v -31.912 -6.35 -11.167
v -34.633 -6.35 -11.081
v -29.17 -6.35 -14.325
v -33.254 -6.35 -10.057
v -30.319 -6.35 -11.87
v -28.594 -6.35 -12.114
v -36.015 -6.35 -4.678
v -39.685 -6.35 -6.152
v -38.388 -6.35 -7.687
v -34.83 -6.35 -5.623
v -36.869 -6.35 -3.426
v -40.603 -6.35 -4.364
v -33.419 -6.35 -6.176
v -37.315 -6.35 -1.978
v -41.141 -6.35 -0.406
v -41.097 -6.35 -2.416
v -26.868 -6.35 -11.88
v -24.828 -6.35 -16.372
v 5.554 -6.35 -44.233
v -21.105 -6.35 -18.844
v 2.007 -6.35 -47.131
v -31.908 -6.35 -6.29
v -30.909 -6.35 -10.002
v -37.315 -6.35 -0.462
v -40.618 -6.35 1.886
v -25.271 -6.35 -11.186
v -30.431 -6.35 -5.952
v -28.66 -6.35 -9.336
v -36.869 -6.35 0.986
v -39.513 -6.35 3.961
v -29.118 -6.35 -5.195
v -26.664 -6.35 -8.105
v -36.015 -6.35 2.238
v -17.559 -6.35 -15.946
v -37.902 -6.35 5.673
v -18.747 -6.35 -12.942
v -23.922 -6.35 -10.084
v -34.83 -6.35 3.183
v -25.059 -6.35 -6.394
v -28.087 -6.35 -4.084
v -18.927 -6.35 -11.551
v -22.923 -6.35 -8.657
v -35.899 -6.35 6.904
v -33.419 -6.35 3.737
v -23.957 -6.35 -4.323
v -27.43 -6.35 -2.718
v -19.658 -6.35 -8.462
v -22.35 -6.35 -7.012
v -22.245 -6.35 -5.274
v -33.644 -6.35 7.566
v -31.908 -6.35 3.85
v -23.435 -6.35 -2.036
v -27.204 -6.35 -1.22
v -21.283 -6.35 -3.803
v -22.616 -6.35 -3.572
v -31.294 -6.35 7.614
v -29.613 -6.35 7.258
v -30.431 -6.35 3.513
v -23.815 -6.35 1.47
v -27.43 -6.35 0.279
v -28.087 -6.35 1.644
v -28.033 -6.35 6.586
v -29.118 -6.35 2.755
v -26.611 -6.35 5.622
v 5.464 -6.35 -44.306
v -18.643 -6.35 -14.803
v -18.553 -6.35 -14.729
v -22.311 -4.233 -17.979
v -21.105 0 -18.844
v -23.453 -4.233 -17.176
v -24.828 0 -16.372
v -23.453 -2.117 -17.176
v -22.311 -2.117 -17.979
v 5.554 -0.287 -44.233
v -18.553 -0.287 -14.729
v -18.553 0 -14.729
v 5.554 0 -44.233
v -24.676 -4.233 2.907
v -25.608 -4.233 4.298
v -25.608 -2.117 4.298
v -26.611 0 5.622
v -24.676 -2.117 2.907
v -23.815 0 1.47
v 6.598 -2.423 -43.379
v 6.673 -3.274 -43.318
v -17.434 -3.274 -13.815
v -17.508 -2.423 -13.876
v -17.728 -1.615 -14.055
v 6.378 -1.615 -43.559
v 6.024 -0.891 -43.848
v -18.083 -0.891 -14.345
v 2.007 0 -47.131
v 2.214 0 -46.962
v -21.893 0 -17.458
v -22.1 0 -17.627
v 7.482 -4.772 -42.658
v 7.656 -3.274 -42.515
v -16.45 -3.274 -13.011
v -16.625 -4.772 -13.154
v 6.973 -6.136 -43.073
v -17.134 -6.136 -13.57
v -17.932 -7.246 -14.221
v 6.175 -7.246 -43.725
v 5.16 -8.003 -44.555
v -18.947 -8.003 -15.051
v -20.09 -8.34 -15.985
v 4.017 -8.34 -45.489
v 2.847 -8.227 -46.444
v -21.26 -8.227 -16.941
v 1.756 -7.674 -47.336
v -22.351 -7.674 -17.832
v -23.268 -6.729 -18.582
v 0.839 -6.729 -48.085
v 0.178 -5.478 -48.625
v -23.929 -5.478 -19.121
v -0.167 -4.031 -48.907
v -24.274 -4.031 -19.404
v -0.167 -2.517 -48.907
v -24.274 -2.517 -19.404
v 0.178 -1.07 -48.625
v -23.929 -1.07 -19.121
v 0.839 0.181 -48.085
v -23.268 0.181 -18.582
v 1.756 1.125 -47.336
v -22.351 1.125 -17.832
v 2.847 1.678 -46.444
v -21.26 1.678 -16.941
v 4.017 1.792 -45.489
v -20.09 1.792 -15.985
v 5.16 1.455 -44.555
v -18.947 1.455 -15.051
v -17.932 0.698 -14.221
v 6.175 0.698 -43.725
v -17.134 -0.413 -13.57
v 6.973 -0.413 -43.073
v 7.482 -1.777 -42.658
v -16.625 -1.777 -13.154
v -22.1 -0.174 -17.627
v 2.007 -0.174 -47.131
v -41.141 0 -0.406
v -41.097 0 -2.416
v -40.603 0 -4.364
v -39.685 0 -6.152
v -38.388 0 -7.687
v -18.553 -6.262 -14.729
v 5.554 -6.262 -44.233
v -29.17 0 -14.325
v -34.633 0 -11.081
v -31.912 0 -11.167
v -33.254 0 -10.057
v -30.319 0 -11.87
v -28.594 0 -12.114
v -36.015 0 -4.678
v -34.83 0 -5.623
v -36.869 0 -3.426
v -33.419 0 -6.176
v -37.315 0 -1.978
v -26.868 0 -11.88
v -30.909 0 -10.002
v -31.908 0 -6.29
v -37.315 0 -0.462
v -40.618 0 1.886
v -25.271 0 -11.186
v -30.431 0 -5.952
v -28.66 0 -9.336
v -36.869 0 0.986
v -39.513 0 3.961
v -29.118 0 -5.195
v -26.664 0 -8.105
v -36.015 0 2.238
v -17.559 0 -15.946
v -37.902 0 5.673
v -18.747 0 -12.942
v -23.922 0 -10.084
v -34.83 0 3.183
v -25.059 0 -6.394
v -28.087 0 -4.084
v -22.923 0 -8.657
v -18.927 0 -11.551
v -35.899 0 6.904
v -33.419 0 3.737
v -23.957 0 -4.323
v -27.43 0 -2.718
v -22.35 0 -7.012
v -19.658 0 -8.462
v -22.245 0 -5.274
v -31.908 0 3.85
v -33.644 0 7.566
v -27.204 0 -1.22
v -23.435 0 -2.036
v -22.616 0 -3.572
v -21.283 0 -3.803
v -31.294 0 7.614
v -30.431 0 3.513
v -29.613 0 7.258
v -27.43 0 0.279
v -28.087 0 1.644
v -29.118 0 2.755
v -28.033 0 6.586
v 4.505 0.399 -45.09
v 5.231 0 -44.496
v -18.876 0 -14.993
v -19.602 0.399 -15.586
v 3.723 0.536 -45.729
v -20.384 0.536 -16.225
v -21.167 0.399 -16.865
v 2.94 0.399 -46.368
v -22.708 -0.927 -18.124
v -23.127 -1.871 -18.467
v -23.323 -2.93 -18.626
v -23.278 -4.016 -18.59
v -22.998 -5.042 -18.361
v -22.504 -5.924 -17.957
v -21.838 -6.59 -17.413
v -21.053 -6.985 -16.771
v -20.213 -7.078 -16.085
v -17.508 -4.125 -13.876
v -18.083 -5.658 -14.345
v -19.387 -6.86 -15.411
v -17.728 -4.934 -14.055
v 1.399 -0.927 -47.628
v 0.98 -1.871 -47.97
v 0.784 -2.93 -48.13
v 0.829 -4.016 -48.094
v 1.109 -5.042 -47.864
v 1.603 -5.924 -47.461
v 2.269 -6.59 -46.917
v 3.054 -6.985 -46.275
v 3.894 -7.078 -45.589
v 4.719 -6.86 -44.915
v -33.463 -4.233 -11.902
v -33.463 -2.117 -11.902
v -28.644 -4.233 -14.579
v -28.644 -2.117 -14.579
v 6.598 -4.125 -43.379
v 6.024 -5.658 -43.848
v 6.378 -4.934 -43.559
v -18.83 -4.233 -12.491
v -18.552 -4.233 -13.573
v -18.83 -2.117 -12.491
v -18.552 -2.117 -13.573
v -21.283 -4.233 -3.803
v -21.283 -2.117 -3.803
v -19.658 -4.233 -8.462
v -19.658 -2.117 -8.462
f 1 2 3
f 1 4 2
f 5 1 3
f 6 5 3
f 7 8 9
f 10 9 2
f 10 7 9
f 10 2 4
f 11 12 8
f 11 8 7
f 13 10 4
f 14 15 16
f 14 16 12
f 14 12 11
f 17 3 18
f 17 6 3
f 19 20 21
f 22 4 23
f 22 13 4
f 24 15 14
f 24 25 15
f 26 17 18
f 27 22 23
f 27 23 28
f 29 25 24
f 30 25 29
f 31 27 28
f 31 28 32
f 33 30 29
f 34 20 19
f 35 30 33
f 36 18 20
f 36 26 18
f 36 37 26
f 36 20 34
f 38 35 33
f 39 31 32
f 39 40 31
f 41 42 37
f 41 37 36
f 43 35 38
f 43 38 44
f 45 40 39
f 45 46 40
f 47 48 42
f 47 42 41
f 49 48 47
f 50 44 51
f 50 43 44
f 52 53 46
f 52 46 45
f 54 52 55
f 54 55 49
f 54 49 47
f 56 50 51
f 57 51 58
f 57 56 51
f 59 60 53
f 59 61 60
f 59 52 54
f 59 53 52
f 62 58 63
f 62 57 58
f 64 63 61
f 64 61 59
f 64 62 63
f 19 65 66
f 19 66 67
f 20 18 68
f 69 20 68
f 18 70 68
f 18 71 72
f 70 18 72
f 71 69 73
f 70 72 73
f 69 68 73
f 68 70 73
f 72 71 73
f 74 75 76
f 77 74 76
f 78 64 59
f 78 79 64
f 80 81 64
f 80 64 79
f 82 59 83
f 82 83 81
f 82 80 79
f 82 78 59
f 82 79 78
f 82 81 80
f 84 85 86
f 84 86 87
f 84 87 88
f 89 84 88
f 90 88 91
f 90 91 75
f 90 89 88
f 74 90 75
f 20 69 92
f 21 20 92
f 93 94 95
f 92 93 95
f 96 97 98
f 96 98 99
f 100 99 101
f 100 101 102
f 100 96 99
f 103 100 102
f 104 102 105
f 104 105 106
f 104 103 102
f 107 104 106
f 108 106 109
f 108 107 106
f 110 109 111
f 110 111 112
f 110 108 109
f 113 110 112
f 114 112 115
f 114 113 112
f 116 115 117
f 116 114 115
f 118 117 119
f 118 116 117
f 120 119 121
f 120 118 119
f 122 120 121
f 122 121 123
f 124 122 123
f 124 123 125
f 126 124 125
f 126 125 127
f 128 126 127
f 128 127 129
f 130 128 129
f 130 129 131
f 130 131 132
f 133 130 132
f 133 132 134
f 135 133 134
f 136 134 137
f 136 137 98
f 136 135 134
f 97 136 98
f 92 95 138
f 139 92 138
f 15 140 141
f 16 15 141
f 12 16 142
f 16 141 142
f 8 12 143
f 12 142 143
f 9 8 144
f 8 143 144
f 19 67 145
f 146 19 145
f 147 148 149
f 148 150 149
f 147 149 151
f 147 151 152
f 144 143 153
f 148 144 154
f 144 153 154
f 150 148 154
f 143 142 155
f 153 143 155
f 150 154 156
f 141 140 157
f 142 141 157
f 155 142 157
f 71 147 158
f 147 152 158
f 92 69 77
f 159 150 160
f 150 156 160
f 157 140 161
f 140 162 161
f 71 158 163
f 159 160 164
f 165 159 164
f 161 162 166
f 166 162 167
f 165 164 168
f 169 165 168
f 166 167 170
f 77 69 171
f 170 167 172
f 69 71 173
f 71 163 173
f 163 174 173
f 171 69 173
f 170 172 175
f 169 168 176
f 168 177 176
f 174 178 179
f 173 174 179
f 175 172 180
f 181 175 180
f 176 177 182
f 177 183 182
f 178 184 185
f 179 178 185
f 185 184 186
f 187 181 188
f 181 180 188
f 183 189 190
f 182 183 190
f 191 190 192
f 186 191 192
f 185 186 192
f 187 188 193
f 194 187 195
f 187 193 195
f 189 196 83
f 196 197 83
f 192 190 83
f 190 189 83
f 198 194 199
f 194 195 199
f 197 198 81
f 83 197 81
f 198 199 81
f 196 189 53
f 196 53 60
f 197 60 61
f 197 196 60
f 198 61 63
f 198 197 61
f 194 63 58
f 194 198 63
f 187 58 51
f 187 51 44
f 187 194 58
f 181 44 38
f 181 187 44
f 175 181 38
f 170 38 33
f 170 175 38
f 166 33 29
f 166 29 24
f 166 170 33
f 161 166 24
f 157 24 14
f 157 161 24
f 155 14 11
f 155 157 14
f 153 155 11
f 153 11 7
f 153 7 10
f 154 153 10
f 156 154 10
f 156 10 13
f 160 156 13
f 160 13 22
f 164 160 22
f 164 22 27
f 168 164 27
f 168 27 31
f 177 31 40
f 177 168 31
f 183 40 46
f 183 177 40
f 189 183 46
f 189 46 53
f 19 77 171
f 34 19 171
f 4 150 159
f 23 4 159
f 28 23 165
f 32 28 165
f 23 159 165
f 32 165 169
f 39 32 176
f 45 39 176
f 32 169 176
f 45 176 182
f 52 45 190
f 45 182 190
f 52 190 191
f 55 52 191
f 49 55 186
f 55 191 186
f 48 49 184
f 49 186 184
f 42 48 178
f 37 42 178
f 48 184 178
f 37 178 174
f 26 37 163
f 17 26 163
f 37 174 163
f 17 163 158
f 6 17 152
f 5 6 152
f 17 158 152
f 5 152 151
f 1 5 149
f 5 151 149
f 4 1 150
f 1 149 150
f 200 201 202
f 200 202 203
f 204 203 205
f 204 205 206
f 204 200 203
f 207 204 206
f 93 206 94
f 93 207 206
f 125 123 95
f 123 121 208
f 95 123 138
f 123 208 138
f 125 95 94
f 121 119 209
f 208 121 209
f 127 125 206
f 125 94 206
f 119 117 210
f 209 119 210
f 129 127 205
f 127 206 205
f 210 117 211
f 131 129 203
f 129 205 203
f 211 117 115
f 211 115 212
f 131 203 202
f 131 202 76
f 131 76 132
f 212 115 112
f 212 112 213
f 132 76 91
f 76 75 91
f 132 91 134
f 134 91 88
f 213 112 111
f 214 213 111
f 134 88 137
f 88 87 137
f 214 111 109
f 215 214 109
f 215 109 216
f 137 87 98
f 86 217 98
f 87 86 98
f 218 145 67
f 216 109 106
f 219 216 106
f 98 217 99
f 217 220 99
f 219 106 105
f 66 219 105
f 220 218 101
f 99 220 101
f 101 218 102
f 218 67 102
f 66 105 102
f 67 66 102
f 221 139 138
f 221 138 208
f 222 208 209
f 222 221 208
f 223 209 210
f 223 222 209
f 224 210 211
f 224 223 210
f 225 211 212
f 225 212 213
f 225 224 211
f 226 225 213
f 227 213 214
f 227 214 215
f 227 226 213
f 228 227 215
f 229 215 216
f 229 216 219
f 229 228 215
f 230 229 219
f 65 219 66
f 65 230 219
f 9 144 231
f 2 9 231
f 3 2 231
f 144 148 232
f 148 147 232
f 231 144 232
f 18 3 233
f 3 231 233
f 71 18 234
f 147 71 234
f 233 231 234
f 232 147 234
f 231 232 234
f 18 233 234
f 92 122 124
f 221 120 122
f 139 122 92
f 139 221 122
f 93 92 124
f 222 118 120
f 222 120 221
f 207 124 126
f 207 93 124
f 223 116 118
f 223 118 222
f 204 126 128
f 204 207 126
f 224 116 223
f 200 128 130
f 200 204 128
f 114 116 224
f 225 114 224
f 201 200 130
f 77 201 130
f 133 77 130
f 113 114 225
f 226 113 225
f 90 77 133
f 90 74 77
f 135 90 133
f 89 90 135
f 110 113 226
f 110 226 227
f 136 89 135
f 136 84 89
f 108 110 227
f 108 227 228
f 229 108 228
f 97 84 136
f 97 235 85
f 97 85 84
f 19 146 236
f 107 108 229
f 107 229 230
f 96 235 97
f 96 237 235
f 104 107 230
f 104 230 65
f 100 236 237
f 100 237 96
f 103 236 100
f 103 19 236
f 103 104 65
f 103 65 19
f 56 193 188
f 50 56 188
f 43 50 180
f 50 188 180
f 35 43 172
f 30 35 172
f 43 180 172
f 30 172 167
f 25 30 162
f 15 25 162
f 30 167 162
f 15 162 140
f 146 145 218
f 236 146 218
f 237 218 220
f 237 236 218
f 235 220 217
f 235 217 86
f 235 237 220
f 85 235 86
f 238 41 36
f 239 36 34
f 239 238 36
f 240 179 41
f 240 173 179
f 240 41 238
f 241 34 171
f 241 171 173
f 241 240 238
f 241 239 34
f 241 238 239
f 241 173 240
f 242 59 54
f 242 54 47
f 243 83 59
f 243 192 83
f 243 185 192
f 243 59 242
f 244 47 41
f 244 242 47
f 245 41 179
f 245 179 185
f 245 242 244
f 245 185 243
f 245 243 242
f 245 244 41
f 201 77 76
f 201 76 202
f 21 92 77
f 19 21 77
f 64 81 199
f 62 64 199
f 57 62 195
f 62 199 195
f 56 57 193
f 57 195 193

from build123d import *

# Parameters (mm, degrees)
F1_R     = 5.084021356
F2_DEPTH = 6.35
F3_R     = 5.08
F4_DEPTH = 38.1


with BuildPart() as f2:
    # F1 (on face) → F2 (new body)
    with BuildSketch(Plane.XZ):
        with BuildLine():
            ThreePointArc((-23.435486266, -2.0356566424), (-23.4073623703, -1.6282166531), (-23.3979811386, -1.2199149375))
            ThreePointArc((-23.3979811386, -1.2199149375), (-23.502785805, 0.1411298632), (-23.8147287088, 1.4700838098))
            add(Edge.make_bspline(
                [(-26.6112679949, 5.621651249), (-25.5726723735, 4.3377625486), (-24.6409406575, 2.9236120143), (-23.8147287088, 1.4700838098)],
                knots=[0, 0, 0, 0, 0.1448384022, 0.1448384022, 0.1448384022, 0.1448384022], degree=3))
            ThreePointArc((-26.6112679949, 5.621651249), (-28.8068112918, 6.9601557527), (-31.2935971509, 7.6142969959))
            Line((-31.2935971509, 7.6142969959), (-23.6553535863, -1.7499138663))
            ThreePointArc((-23.6553535863, -1.7499138663), (-23.5433915196, -1.8912244789), (-23.435486266, -2.0356566424))
        make_face()
        with BuildLine():
            ThreePointArc((-23.8147287088, 1.4700838098), (-23.502785805, 0.1411298632), (-23.3979811386, -1.2199149375))
            ThreePointArc((-23.3979811386, -1.2199149375), (-23.4073623703, -1.6282166531), (-23.435486266, -2.0356566424))
            ThreePointArc((-23.435486266, -2.0356566424), (-24.5585613429, -10.6811993954), (-33.2543862597, -10.0572313368))
            ThreePointArc((-33.2543862597, -10.0572313368), (-36.0145517074, -9.2911460577), (-38.3878110502, -7.6870762197))
            add(Edge.make_bspline(
                [(-38.3878110502, -7.6870762197), (-33.7082410797, -12.8874080847), (-27.843105649, -14.8041480157), (-24.8275432116, -16.3721035764)],
                knots=[0, 0, 0, 0, 0.6549803292, 0.6549803292, 0.6549803292, 0.6549803292], degree=3))
            Line((-24.8275432116, -16.3721035764), (-18.9267995353, -11.5507319804))
            add(Edge.make_bspline(
                [(-23.8147287088, 1.4700838098), (-20.8244478634, -3.7906214549), (-19.2163795919, -9.5671382328), (-18.9267995353, -11.5507319804)],
                knots=[0.1448384022, 0.1448384022, 0.1448384022, 0.1448384022, 0.6690471122, 0.6690471122, 0.6690471122, 0.6690471122], degree=3))
        make_face()
        with BuildLine():
            ThreePointArc((-33.2543862597, -10.0572313368), (-26.6635684549, -8.1045414316), (-23.435486266, -2.0356566424))
            ThreePointArc((-23.435486266, -2.0356566424), (-23.5433915196, -1.8912244789), (-23.6553535863, -1.7499138663))
            Line((-23.6553535863, -1.7499138663), (-31.2935971509, 7.6142969959))
            ThreePointArc((-31.2935971509, 7.6142969959), (-37.9022105078, 5.6730182981), (-41.1406471645, -0.4060327385))
            Line((-41.1406471645, -0.4060327385), (-33.4966443619, -9.7773042187))
            ThreePointArc((-33.4966443619, -9.7773042187), (-33.3775556867, -9.9190335859), (-33.2543862597, -10.0572313368))
        make_face()
        with Locations((-32.2879811386, -1.2199149375)):
            Circle(F1_R, mode=Mode.SUBTRACT)
        with BuildLine():
            add(Edge.make_bspline(
                [(-18.9267995353, -11.5507319804), (-18.7439766364, -12.8030501249), (-19.0866869126, -12.5435558307), (-17.5587098689, -15.9462096301)],
                knots=[0.6690471122, 0.6690471122, 0.6690471122, 0.6690471122, 1, 1, 1, 1], degree=3))
            Line((-18.9267995353, -11.5507319804), (-24.8275432116, -16.3721035764))
            add(Edge.make_bspline(
                [(-24.8275432116, -16.3721035764), (-23.2390552632, -17.1980451921), (-22.4412659418, -17.9272062293), (-21.1053046157, -18.8440564292)],
                knots=[0.6549803292, 0.6549803292, 0.6549803292, 0.6549803292, 1, 1, 1, 1], degree=3))
            Line((-21.1053046157, -18.8440564292), (-17.5587098689, -15.9462096301))
        make_face()
        with BuildLine():
            ThreePointArc((-38.3878110502, -7.6870762197), (-36.0145517074, -9.2911460577), (-33.2543862597, -10.0572313368))
            ThreePointArc((-33.2543862597, -10.0572313368), (-33.3775556867, -9.9190335859), (-33.4966443619, -9.7773042187))
            Line((-33.4966443619, -9.7773042187), (-41.1406471645, -0.4060327385))
            ThreePointArc((-41.1406471645, -0.4060327385), (-40.6034896759, -4.3638643274), (-38.3878110502, -7.6870762197))
        make_face()
        Polygon((5.5537237598, -44.232879484), (-17.5587098689, -15.9462096301), (-21.1053046157, -18.8440564292), (2.007129013, -47.1307262831), align=None)
    extrude(amount=F2_DEPTH)


with BuildPart() as f4:
    # F3 (on face) → F4 (new body)
    with BuildSketch(Plane(origin=(23.8960697274, 0, -29.2457404549), x_dir=(0.7743758105, 0, 0.6327259312), z_dir=(0.6327259312, 0, -0.7743758105))):
        with Locations((-26.0512717068, 3.2741681207)):
            Circle(F3_R)
        with BuildLine():
            ThreePointArc((-23.6866205246, 6.2615624345), (-22.6215908904, 4.9335021732), (-22.2412717068, 3.2741681207))
            ThreePointArc((-22.2412717068, 3.2741681207), (-22.6215908904, 1.6148340682), (-23.6866205246, 0.2867738069))
            Line((-23.6866205246, 0.2867738069), (-23.6866205246, 0))
            Line((-23.6866205246, 0), (-24.1029588168, 0))
            ThreePointArc((-24.1029588168, 0), (-26.0512717068, -0.5358318793), (-27.9995845968, 0))
            Line((-27.9995845968, 0), (-28.2665605208, 0))
            Line((-28.2665605208, 0), (-28.2665605208, 0.174394666))
            ThreePointArc((-28.2665605208, 0.174394666), (-29.139118789, 5.506050823), (-23.8028593224, 6.35))
            Line((-23.8028593224, 6.35), (-23.6866205246, 6.35))
            Line((-23.6866205246, 6.35), (-23.6866205246, 6.2615624345))
        make_face(mode=Mode.SUBTRACT)
    extrude(amount=-F4_DEPTH)


solid = Compound([f2.part, f4.part])
